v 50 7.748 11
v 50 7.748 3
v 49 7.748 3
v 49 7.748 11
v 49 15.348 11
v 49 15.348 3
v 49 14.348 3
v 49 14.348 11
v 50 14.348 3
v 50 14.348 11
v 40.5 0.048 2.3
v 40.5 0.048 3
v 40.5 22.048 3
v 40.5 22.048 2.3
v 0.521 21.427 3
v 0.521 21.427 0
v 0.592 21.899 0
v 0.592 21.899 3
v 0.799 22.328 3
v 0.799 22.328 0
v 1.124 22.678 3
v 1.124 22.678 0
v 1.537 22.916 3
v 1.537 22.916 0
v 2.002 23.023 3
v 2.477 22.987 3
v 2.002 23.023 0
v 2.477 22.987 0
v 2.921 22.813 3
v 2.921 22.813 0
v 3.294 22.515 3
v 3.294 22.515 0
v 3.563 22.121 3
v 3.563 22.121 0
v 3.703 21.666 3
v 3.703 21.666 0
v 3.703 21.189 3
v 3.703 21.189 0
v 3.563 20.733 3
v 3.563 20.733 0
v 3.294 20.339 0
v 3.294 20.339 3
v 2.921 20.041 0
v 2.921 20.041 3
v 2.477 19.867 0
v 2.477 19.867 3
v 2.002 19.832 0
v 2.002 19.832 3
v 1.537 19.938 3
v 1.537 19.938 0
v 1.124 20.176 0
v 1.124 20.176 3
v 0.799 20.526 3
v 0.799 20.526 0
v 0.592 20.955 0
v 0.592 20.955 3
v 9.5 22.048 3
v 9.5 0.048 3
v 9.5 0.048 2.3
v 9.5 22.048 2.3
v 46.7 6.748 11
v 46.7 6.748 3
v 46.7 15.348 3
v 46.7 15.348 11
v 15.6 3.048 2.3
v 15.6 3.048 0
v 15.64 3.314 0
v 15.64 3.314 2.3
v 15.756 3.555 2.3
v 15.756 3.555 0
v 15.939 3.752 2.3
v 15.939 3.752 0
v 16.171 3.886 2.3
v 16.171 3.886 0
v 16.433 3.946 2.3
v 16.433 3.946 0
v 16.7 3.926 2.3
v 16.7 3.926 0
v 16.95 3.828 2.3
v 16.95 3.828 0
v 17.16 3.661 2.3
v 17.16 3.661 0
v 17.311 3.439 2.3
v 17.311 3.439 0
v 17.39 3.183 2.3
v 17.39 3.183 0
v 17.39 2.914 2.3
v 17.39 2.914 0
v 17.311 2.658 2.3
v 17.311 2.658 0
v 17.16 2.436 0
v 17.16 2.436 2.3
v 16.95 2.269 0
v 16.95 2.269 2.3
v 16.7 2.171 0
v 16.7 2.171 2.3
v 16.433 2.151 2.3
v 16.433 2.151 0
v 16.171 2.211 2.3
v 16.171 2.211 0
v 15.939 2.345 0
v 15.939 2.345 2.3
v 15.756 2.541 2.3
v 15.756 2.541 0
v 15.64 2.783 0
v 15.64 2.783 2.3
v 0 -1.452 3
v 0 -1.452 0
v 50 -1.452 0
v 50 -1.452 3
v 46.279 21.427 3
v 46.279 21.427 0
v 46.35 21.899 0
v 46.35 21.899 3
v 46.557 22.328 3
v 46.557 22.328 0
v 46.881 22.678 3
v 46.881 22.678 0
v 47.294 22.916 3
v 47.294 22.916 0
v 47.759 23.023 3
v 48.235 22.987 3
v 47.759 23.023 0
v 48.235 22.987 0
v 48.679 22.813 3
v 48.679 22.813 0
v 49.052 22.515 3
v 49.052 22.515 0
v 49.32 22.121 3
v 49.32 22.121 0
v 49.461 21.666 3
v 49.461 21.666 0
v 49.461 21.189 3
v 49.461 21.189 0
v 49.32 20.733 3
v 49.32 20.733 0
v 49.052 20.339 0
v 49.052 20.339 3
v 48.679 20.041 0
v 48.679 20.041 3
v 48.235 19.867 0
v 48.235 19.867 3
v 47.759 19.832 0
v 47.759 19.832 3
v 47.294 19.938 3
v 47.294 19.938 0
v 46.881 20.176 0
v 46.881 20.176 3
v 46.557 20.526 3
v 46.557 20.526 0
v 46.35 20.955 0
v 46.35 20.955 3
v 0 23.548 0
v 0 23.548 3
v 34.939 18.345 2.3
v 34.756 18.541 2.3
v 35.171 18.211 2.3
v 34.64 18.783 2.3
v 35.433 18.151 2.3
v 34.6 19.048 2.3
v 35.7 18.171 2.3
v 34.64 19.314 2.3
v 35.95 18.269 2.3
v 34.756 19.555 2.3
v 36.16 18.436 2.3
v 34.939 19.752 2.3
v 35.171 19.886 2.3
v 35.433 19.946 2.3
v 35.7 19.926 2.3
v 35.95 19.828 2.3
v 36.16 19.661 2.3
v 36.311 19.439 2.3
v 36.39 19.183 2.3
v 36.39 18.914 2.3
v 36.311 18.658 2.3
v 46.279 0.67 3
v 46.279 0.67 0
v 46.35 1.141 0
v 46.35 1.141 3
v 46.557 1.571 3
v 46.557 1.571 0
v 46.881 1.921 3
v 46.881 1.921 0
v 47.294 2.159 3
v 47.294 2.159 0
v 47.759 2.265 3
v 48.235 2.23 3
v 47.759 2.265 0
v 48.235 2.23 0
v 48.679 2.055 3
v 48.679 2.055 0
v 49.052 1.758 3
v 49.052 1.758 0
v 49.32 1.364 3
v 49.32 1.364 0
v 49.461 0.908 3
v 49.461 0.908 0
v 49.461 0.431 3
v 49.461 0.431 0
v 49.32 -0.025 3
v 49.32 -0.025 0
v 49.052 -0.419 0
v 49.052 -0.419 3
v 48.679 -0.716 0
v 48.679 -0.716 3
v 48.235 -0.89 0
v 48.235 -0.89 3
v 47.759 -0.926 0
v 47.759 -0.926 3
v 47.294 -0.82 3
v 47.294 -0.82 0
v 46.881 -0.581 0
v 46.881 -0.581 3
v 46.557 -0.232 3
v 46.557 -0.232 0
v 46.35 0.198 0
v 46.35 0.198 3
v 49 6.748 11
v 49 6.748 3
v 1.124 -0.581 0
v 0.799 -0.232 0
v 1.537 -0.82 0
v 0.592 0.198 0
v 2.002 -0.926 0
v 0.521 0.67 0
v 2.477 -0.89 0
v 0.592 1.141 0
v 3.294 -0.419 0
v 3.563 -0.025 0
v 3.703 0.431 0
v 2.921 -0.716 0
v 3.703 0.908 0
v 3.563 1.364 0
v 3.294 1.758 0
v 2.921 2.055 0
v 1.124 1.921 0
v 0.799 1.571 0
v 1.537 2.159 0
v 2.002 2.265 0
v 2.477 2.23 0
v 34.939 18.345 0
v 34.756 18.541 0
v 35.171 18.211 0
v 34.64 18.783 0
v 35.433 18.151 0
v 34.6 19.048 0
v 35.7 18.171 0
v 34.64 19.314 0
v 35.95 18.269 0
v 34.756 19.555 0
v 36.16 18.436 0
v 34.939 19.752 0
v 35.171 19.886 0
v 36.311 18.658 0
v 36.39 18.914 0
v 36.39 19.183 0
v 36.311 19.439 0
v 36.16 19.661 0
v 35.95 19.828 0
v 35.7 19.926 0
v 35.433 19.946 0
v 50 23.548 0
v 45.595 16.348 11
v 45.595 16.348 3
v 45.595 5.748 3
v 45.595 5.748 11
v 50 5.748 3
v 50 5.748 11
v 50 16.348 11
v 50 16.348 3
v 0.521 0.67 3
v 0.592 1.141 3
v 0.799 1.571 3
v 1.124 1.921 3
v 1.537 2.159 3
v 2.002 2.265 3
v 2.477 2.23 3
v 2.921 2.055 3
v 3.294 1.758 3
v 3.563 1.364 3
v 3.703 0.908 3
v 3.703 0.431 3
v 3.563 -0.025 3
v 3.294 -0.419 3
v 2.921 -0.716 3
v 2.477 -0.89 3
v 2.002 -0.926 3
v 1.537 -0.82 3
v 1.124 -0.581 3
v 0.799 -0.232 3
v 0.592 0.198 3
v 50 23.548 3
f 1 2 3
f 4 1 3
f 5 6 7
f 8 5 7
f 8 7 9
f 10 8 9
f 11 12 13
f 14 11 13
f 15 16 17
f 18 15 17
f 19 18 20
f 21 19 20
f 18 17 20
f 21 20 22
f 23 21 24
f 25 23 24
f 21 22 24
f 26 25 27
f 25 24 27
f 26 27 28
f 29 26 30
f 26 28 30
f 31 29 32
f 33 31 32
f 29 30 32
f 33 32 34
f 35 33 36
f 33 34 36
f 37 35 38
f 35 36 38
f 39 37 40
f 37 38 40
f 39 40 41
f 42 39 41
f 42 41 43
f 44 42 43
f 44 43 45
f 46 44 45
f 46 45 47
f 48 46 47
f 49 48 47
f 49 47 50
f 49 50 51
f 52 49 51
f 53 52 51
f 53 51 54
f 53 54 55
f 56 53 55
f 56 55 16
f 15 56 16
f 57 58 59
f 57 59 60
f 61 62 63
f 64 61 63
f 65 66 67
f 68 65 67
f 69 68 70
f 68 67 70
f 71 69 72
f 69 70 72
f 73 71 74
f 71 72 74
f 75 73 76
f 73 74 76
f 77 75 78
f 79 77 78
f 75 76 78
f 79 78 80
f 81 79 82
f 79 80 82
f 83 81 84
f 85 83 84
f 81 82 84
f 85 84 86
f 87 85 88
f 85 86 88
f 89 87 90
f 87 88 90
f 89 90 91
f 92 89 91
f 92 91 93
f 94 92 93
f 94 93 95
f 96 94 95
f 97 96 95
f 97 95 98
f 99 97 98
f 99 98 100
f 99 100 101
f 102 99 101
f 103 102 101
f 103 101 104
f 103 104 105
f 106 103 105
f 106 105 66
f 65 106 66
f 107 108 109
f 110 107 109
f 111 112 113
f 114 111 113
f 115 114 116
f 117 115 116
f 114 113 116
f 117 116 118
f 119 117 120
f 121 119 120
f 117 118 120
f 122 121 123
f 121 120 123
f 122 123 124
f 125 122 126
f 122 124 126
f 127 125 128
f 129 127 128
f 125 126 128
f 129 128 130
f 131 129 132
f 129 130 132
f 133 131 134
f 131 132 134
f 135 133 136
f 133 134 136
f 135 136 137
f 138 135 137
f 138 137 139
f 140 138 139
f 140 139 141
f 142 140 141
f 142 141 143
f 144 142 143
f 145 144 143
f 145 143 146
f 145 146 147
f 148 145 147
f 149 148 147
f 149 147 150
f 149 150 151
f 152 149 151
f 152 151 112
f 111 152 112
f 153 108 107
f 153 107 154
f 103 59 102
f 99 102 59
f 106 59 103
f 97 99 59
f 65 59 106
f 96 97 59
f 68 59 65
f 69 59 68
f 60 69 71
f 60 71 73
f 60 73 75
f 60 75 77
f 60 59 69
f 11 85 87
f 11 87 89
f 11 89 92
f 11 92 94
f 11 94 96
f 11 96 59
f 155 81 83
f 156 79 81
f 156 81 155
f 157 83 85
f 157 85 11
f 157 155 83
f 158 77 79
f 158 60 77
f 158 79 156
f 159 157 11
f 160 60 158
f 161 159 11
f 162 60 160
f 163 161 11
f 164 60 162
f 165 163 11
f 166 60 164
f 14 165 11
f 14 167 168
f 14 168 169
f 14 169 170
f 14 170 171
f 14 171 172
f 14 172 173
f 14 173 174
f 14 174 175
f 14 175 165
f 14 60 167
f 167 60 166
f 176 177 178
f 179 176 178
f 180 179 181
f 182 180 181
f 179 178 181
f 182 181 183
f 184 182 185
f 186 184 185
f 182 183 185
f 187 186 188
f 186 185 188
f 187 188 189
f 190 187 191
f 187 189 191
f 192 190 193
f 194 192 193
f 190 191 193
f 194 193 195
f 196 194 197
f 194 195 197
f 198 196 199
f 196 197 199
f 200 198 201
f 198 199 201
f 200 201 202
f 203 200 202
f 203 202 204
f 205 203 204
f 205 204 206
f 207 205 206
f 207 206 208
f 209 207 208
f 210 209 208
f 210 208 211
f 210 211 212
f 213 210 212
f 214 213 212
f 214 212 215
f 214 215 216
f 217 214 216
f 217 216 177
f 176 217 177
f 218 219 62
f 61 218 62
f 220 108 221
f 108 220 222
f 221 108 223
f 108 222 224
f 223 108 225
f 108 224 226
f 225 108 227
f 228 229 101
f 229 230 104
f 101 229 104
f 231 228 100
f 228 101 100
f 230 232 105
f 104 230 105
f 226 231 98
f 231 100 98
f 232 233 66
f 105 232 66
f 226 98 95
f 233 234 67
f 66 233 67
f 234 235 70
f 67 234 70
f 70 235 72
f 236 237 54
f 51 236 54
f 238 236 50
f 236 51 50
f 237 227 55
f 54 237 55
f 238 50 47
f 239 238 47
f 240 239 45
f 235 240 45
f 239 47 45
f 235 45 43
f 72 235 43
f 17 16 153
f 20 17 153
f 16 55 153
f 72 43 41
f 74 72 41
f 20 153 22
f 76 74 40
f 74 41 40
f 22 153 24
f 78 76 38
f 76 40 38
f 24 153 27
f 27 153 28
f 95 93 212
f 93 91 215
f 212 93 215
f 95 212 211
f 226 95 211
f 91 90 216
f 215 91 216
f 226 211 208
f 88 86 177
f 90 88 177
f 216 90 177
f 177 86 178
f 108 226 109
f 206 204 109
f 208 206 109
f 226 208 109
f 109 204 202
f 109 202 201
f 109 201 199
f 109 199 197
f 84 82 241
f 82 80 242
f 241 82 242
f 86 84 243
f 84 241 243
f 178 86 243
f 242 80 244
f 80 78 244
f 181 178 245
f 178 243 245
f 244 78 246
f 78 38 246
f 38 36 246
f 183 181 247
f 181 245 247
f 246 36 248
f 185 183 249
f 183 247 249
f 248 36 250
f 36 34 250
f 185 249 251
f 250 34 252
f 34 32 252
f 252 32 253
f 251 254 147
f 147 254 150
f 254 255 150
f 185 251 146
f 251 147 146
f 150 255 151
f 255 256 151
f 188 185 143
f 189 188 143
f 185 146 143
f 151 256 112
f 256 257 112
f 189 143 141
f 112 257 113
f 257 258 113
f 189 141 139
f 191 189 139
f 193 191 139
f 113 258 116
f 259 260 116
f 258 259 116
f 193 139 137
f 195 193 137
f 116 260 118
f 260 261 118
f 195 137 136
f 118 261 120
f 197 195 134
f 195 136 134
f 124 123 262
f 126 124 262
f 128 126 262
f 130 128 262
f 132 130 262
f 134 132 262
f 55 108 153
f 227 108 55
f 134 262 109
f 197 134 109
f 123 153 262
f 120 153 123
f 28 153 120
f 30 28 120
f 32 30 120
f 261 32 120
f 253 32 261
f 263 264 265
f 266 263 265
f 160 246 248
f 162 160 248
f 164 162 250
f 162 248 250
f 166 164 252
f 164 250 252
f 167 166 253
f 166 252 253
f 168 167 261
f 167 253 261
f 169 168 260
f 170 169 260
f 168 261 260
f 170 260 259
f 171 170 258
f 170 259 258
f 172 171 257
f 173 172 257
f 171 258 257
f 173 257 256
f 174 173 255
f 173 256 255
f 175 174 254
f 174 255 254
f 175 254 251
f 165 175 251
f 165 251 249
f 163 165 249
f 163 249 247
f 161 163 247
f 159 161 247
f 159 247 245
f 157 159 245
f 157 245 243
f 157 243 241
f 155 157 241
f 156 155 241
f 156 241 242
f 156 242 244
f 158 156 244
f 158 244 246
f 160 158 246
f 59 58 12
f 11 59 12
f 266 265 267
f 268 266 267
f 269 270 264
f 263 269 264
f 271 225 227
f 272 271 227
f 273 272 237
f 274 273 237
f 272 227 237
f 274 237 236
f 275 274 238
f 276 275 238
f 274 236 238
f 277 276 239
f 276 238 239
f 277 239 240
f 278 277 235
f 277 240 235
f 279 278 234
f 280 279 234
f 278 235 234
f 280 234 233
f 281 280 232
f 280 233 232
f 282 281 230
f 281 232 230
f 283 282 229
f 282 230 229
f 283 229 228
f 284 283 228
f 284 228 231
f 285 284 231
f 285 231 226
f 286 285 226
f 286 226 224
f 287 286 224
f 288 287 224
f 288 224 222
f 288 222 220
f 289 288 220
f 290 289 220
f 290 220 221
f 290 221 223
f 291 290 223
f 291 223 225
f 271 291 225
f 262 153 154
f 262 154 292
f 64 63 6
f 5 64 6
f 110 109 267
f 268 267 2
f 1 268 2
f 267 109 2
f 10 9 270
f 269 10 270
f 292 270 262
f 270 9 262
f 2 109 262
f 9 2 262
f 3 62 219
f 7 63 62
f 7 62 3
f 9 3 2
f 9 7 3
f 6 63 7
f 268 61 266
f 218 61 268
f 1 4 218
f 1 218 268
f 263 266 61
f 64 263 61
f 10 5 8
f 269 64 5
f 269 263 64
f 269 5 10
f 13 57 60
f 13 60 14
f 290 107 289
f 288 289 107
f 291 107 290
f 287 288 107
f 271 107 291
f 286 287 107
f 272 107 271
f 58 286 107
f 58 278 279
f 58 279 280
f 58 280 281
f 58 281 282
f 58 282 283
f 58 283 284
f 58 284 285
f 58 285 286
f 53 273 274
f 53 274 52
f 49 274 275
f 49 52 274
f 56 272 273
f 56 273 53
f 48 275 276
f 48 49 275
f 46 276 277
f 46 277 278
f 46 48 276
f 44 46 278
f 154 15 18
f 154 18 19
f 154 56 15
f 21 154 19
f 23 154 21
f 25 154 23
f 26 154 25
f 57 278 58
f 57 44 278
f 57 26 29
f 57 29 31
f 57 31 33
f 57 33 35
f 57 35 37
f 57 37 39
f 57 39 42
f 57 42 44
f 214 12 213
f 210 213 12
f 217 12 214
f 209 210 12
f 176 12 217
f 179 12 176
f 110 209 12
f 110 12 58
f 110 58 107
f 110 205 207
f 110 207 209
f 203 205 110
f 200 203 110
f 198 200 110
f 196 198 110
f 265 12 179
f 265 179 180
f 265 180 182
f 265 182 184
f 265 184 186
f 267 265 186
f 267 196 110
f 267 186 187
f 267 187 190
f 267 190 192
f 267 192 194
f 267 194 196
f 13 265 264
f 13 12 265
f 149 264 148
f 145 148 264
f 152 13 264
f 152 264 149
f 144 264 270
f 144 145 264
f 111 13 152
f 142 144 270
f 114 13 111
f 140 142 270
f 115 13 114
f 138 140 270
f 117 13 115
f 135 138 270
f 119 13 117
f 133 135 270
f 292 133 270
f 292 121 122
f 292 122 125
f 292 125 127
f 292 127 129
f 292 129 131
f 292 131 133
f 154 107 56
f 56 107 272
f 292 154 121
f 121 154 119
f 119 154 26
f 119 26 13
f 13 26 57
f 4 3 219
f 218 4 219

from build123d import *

# Parameters (mm, degrees)
F0_W     = 50
F0_H     = 25
F1_DEPTH = 3
F3_D     = 3.2
F4_W     = 31
F4_H     = 22
F5_DEPTH = 0.7
F7_D     = 1.8
F9_DEPTH = 8


with BuildPart() as f1:
    # F0 (on Top) → F1 (new body)
    with BuildSketch(Plane.XY):
        with Locations((25, 11.048387)):
            Rectangle(F0_W, F0_H)
    extrude(amount=F1_DEPTH)

    # F3 (through all)
    with Locations(Plane.XY.offset(3)):
        with Locations((2.12132, 21.427067), (47.87868, 21.427067), (47.87868, 0.669707), (2.12132, 0.669707)):
            Hole(F3_D / 2)

    # F4 (on face) → F5 (cut)
    with BuildSketch(Plane.XY.offset(3)):
        with Locations((25, 11.048387)):
            Rectangle(F4_W, F4_H)
    extrude(amount=-F5_DEPTH, mode=Mode.SUBTRACT)

    # F7 (through all)
    with Locations(Plane.XY.offset(2.3)):
        with Locations((16.5, 3.048387), (35.5, 19.048387)):
            Hole(F7_D / 2)

    # F8 (on face) → F9 (join)
    with BuildSketch(Plane.XY.offset(3)):
        Polygon((49, 15.348387), (49, 14.348387), (50, 14.348387), (50, 16.348387), (49, 16.348387), (45.595244, 16.348387), (45.595244, 15.348387), (45.595244, 6.748387), (45.595244, 5.748387), (49, 5.748387), (50, 5.748387), (50, 7.748387), (49, 7.748387), (49, 6.748387), (46.7, 6.748387), (46.7, 15.348387), align=None)
    extrude(amount=F9_DEPTH)


solid = f1.part
